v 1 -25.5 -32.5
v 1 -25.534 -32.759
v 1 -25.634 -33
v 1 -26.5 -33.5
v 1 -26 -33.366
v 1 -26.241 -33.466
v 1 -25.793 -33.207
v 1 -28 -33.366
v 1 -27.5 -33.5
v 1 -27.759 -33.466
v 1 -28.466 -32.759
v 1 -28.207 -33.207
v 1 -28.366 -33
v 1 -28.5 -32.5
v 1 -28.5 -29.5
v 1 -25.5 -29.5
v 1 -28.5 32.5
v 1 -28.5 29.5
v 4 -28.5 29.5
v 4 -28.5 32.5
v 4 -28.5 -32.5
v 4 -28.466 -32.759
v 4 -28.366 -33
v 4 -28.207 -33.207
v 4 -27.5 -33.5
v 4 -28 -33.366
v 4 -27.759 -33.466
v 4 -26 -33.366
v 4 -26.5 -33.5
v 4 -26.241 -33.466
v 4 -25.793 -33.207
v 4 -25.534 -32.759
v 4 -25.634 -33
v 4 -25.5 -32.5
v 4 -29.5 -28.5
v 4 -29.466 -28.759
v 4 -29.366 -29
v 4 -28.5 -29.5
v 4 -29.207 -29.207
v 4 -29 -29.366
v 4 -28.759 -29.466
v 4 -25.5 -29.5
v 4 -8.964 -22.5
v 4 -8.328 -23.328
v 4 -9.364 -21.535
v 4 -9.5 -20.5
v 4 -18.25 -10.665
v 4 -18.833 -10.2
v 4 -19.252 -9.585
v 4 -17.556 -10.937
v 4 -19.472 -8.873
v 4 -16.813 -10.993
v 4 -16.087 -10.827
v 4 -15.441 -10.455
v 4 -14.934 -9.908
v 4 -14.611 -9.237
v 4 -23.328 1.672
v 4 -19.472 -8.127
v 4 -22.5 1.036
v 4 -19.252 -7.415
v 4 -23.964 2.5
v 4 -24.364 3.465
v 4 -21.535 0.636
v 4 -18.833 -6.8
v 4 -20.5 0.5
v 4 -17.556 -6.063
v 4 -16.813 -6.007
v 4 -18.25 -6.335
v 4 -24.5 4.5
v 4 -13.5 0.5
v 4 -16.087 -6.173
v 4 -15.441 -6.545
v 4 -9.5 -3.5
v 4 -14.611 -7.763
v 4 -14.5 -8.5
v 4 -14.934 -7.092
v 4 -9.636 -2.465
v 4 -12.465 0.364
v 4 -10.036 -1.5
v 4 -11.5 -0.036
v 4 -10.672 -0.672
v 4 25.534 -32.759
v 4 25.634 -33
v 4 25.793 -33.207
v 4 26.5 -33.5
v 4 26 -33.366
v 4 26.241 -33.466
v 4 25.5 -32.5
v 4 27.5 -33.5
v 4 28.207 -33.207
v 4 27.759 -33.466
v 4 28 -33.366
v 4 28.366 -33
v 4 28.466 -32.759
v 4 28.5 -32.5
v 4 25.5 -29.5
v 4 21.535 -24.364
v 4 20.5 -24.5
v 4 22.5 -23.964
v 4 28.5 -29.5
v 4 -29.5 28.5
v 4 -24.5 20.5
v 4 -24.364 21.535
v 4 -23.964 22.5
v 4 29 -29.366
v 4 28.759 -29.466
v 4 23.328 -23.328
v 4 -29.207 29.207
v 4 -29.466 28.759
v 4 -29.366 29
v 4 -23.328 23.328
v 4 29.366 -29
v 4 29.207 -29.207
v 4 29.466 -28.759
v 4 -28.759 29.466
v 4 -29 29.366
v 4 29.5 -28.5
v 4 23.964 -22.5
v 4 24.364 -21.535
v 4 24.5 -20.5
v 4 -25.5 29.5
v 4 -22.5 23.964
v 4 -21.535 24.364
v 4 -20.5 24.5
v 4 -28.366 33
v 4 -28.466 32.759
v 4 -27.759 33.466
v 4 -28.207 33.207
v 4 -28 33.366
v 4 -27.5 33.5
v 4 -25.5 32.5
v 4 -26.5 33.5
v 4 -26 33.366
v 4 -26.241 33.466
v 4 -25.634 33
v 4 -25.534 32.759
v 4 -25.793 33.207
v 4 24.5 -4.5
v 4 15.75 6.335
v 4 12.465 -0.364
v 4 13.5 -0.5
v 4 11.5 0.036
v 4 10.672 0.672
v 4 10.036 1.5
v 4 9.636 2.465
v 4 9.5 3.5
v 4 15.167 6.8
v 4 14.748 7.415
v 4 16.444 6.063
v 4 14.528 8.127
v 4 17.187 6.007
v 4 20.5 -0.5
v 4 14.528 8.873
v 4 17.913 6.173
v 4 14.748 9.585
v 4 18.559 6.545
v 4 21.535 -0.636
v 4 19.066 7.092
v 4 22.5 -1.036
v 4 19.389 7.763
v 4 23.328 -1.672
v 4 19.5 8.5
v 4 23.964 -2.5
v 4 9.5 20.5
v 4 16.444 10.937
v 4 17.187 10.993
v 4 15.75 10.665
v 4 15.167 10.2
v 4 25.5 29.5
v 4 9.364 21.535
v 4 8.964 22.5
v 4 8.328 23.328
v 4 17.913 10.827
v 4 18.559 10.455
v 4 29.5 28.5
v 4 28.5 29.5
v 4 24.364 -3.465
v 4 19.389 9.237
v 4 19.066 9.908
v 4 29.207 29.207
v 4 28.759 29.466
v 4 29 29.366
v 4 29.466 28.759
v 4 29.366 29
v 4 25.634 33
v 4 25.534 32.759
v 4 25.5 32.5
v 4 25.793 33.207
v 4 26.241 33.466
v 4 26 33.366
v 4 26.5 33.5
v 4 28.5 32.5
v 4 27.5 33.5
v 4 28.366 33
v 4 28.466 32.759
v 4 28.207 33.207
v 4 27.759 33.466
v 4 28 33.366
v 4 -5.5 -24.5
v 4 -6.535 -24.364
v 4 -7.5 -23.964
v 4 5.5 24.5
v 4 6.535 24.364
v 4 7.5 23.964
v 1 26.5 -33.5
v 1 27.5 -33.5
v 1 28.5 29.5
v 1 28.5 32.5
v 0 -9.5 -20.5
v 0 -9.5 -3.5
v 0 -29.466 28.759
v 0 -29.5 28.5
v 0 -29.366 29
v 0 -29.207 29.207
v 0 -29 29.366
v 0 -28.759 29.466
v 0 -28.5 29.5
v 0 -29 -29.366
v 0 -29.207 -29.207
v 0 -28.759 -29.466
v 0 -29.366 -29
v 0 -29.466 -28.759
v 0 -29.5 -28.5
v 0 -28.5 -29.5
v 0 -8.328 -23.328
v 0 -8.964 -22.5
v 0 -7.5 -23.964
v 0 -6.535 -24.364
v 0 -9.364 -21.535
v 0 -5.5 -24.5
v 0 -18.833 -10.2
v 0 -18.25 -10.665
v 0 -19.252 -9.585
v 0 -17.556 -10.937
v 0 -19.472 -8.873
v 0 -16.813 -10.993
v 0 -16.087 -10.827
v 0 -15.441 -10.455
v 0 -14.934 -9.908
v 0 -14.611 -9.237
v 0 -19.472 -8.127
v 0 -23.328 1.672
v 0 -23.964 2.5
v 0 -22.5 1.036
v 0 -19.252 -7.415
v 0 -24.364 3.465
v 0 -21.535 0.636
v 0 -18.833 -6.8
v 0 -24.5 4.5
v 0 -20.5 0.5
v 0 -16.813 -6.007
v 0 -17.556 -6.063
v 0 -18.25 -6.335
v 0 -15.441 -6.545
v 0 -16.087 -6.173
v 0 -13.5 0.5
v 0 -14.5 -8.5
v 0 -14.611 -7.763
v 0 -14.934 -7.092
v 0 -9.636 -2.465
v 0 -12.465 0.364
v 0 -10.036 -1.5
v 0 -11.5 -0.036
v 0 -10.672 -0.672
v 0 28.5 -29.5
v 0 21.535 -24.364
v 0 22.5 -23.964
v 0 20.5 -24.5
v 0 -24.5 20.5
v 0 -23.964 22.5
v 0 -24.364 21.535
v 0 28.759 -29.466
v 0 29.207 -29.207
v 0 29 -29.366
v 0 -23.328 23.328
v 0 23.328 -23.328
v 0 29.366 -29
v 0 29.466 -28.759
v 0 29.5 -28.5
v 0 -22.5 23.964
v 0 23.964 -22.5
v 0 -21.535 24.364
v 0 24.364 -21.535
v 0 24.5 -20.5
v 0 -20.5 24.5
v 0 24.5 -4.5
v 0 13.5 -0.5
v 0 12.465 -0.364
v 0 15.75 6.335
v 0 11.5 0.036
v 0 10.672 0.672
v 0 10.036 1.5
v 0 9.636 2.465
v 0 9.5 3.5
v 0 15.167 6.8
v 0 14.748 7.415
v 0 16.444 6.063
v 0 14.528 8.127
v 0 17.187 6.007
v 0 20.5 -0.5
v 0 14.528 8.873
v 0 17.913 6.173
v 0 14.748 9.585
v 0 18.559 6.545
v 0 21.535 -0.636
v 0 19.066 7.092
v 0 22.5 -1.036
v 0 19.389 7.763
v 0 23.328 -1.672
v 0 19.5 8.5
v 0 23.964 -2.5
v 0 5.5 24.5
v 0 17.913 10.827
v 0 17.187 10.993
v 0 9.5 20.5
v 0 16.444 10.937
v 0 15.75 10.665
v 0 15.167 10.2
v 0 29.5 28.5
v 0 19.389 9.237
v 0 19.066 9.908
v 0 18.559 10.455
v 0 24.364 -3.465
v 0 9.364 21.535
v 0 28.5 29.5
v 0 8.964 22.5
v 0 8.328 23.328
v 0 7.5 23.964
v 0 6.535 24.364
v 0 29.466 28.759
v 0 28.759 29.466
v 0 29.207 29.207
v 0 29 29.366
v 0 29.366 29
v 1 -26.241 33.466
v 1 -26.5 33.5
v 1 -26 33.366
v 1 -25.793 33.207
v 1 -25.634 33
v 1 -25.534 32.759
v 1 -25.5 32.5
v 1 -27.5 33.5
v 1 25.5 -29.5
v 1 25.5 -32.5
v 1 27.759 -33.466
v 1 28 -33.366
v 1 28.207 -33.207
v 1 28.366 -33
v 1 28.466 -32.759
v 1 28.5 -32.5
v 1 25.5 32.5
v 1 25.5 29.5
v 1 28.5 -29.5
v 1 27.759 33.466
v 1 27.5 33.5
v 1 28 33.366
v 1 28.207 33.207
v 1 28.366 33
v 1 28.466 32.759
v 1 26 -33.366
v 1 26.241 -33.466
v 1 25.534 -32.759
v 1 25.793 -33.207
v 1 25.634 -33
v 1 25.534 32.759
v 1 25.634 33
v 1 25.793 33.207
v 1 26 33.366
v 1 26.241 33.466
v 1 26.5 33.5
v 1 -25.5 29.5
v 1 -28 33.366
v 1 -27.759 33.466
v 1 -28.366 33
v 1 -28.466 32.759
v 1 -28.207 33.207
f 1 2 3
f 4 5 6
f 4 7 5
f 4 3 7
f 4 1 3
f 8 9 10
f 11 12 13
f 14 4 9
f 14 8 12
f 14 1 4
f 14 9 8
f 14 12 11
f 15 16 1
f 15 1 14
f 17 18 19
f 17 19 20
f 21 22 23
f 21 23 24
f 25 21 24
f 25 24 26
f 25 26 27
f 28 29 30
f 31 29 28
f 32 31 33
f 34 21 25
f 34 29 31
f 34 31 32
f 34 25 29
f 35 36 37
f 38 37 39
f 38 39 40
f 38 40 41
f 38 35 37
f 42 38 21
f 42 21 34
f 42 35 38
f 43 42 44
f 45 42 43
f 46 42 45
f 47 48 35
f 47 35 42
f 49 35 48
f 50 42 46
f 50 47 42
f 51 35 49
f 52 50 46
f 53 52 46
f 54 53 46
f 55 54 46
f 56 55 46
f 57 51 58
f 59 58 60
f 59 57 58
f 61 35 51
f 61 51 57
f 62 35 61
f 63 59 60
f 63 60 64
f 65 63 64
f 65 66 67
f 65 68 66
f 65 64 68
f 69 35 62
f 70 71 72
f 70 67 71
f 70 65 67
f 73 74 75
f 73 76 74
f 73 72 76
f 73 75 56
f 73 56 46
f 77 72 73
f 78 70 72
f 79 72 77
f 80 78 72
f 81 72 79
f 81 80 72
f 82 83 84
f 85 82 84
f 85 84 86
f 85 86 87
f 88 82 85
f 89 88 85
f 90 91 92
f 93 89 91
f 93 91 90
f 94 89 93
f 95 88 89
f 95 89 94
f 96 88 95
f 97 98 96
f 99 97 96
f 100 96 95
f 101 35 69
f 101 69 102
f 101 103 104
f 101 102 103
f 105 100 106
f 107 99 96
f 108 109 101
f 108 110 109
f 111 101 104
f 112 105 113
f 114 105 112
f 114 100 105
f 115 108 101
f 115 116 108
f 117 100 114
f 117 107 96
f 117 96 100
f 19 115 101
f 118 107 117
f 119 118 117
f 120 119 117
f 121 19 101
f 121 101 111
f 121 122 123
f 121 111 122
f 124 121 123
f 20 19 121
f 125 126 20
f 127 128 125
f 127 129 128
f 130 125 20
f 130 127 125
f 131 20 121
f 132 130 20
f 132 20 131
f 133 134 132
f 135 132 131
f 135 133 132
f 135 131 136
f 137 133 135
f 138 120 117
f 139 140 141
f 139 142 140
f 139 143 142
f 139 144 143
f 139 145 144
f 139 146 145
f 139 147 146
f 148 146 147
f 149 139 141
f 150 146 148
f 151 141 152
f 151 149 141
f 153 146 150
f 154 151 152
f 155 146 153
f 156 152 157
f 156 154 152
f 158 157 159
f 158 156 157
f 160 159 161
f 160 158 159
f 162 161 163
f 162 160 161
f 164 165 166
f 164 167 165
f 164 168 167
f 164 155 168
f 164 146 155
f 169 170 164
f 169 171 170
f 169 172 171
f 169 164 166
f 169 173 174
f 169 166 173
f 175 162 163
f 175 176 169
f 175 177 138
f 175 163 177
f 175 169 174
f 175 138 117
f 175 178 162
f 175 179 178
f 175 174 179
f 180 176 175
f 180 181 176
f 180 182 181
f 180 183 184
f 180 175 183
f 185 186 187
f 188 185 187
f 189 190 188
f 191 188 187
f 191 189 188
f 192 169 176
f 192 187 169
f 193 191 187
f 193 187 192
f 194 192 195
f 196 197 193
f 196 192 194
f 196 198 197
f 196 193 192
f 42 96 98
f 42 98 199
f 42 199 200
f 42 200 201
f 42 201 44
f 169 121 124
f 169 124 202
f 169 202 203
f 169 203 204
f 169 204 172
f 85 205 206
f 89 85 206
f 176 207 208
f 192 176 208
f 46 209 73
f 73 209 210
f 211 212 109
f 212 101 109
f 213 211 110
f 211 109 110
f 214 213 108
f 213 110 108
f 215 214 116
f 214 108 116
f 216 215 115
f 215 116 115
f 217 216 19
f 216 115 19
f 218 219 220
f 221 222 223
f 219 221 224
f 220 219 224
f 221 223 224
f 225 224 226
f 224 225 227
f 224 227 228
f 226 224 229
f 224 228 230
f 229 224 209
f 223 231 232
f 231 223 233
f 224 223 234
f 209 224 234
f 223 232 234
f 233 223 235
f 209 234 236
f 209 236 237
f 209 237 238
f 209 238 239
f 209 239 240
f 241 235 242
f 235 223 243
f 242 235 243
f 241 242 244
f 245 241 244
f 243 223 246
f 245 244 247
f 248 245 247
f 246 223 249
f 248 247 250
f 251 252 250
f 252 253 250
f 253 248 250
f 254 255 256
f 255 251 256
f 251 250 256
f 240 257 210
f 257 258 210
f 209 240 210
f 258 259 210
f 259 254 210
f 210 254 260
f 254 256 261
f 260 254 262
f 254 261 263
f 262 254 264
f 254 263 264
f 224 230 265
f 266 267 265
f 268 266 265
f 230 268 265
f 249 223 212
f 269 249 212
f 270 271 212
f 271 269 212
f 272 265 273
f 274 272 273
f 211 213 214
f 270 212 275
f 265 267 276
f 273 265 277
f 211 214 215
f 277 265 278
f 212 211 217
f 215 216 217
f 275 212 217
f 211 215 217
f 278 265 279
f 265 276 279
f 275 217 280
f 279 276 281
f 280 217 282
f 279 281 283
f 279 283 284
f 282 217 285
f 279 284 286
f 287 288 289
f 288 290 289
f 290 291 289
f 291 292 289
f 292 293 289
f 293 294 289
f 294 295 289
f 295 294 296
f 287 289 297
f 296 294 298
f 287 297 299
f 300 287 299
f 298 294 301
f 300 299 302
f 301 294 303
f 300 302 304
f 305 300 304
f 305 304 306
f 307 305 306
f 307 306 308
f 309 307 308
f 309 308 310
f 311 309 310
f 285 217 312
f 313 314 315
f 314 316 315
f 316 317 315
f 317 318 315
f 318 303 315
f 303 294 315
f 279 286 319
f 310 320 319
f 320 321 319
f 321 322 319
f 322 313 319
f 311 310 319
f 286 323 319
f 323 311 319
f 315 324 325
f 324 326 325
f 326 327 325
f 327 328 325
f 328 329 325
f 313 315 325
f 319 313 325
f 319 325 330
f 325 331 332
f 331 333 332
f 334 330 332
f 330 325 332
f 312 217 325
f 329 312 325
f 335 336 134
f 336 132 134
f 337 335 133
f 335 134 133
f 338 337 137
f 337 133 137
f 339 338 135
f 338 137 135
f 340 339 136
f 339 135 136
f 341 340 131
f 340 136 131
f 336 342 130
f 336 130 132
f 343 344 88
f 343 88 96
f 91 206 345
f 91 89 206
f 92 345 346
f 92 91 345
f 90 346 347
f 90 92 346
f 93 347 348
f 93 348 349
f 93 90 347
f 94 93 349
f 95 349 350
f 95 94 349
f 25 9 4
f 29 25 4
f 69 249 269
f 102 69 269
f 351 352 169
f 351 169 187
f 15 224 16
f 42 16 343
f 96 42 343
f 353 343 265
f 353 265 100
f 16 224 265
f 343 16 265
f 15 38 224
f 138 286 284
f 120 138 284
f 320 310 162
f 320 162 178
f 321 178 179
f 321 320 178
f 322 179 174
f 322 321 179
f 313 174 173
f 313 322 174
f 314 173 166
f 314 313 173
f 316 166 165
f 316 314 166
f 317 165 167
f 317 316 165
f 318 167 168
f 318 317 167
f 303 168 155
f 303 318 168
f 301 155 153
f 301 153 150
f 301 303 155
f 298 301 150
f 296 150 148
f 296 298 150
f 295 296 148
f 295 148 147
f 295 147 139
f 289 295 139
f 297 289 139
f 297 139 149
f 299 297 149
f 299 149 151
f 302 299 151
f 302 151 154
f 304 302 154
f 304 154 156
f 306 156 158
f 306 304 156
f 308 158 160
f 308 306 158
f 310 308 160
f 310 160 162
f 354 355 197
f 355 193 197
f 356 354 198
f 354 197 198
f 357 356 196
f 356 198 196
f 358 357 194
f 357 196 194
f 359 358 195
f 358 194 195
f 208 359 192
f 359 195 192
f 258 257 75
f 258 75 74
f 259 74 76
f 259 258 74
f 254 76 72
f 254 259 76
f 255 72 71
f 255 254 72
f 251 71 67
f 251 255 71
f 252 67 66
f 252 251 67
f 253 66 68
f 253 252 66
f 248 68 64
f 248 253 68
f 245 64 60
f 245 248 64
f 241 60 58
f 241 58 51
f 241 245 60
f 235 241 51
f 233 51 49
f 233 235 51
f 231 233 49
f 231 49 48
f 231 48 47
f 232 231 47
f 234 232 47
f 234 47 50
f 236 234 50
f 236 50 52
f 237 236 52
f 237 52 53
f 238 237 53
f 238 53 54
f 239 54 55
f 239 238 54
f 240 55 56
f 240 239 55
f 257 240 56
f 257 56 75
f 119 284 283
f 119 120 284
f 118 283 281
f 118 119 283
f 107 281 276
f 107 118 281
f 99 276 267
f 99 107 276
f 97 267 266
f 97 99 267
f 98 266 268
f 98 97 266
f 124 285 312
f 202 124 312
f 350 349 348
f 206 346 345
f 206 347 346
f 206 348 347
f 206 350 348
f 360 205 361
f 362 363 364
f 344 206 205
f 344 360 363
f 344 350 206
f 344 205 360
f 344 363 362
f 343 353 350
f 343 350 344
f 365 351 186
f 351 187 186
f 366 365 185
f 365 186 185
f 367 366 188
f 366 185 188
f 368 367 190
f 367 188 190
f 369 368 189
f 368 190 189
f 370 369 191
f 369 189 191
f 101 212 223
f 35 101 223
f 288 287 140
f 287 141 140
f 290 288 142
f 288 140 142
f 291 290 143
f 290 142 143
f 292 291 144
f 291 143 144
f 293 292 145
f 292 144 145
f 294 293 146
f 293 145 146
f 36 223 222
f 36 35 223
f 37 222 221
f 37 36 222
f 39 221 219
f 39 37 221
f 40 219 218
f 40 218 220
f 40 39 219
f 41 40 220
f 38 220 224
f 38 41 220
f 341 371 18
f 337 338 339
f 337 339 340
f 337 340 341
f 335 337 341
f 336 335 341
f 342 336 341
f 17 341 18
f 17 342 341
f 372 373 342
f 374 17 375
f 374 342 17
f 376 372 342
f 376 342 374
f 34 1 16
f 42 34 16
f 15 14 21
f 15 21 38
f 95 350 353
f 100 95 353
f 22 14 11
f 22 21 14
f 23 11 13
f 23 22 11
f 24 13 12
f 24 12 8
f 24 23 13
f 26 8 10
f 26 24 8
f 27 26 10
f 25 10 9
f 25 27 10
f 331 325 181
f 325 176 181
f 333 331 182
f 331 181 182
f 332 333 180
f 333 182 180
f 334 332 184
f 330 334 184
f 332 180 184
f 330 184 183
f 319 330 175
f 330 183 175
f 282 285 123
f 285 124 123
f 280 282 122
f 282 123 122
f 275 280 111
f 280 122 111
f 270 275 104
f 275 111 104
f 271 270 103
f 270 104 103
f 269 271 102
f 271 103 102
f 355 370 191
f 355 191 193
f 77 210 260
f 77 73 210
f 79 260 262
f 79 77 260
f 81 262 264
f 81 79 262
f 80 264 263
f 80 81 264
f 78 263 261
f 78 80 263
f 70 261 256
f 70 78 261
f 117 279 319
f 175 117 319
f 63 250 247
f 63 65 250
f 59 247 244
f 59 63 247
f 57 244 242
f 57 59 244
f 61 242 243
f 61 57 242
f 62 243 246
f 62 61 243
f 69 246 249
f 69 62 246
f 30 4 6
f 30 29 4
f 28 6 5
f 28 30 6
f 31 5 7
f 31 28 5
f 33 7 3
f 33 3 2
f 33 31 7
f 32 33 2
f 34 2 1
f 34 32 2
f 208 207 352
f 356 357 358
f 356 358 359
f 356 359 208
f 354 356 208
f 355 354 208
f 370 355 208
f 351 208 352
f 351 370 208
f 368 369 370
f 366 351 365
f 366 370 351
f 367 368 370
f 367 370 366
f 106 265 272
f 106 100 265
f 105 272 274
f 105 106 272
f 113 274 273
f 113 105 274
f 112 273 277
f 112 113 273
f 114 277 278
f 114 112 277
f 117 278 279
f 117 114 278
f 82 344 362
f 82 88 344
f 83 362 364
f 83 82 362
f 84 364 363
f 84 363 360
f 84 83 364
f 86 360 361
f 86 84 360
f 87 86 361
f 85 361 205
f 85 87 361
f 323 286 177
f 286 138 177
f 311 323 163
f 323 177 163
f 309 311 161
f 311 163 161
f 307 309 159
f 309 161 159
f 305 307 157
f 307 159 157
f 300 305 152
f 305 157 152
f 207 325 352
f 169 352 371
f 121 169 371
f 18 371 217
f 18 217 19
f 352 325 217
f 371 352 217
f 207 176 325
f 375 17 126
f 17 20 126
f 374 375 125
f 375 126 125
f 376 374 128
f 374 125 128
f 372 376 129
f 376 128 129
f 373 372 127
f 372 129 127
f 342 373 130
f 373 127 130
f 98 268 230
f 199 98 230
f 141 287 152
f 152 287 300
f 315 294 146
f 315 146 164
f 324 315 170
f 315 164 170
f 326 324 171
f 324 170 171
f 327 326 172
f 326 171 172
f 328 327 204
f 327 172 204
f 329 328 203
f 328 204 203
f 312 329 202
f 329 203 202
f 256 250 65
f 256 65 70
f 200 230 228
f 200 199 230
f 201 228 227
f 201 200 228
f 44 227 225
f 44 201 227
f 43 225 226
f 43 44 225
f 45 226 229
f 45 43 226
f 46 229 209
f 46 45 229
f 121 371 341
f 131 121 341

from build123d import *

# Parameters (mm, degrees)
F0_W     = 3
F0_H     = 4
F0_W_2   = 15
F0_H_2   = 25
F0_R     = 2.5
F1_DEPTH = 4
F2_W     = 3
F2_H     = 4
F3_DEPTH = 1
F4_R     = 4
F5_R     = 0.99999


# Not quite as in the source:
# - a fillet or chamfer is up to 0.001 mm smaller than in the source, because OpenCascade refuses the exact size


with BuildPart() as f1:
    # F0 (on Right) → F1 (new body)
    with BuildSketch(Plane.YZ):
        Polygon((-28.5, 29.5), (-29.5, 29.5), (-29.5, -29.5), (-28.5, -29.5), (-25.5, -29.5), (25.5, -29.5), (28.5, -29.5), (29.5, -29.5), (29.5, 29.5), (28.5, 29.5), (25.5, 29.5), (-25.5, 29.5), align=None)
        Polygon((-24.5, 0.5), (-24.5, 24.5), (9.5, 24.5), (24.5, 24.5), (24.5, -0.5), (24.5, -24.5), (-9.5, -24.5), (-24.5, -24.5), align=None, mode=Mode.SUBTRACT)
        with Locations((-27, 31.5)):
            Rectangle(F0_W, F0_H)
        with Locations((27, 31.5)):
            Rectangle(F0_W, F0_H)
        with Locations((-27, -31.5)):
            Rectangle(F0_W, F0_H)
        with Locations((27, -31.5)):
            Rectangle(F0_W, F0_H)
        with Locations((-17, -12)):
            Rectangle(F0_W_2, F0_H_2)
        with Locations((-17, -8.5)):
            Circle(F0_R, mode=Mode.SUBTRACT)
        with Locations((17, 12)):
            Rectangle(F0_W_2, F0_H_2)
        with Locations((17, 8.5)):
            Circle(F0_R, mode=Mode.SUBTRACT)
    extrude(amount=F1_DEPTH)

    # F2 (on face) → F3 (cut)
    with BuildSketch(Plane(origin=(0, 0, 0), x_dir=(0, -1, 0), z_dir=(-1, 0, 0))):
        with Locations((-27, 31.5)):
            Rectangle(F2_W, F2_H)
        with Locations((27, 31.5)):
            Rectangle(F2_W, F2_H)
        with Locations((-27, -31.5)):
            Rectangle(F2_W, F2_H)
        with Locations((27, -31.5)):
            Rectangle(F2_W, F2_H)
    extrude(amount=-F3_DEPTH, mode=Mode.SUBTRACT)

    # F4
    f4_edges = [f1.edges().sort_by_distance(p)[0] for p in [
        (2, 9.5, -0.5),
        (2, 9.5, 24.5),
        (2, 24.5, -0.5),
        (2, -9.5, 0.5),
        (2, -24.5, 0.5),
        (2, -9.5, -24.5),
        (2, -24.5, 24.5),
        (2, 24.5, -24.5),
    ]]
    fillet(f4_edges, radius=F4_R)

    # F5 (radius 1 in the source; OpenCascade refuses exactly that, so slightly less here)
    f5_edges = [f1.edges().sort_by_distance(p)[0] for p in [
        (2.5, 28.5, 33.5),
        (2.5, 25.5, 33.5),
        (2.5, -25.5, 33.5),
        (2.5, -28.5, 33.5),
        (2, 29.5, 29.5),
        (2, -29.5, 29.5),
        (2, -29.5, -29.5),
        (2.5, -28.5, -33.5),
        (2.5, -25.5, -33.5),
        (2, 29.5, -29.5),
        (2.5, 28.5, -33.5),
        (2.5, 25.5, -33.5),
    ]]
    fillet(f5_edges, radius=F5_R)


solid = f1.part
